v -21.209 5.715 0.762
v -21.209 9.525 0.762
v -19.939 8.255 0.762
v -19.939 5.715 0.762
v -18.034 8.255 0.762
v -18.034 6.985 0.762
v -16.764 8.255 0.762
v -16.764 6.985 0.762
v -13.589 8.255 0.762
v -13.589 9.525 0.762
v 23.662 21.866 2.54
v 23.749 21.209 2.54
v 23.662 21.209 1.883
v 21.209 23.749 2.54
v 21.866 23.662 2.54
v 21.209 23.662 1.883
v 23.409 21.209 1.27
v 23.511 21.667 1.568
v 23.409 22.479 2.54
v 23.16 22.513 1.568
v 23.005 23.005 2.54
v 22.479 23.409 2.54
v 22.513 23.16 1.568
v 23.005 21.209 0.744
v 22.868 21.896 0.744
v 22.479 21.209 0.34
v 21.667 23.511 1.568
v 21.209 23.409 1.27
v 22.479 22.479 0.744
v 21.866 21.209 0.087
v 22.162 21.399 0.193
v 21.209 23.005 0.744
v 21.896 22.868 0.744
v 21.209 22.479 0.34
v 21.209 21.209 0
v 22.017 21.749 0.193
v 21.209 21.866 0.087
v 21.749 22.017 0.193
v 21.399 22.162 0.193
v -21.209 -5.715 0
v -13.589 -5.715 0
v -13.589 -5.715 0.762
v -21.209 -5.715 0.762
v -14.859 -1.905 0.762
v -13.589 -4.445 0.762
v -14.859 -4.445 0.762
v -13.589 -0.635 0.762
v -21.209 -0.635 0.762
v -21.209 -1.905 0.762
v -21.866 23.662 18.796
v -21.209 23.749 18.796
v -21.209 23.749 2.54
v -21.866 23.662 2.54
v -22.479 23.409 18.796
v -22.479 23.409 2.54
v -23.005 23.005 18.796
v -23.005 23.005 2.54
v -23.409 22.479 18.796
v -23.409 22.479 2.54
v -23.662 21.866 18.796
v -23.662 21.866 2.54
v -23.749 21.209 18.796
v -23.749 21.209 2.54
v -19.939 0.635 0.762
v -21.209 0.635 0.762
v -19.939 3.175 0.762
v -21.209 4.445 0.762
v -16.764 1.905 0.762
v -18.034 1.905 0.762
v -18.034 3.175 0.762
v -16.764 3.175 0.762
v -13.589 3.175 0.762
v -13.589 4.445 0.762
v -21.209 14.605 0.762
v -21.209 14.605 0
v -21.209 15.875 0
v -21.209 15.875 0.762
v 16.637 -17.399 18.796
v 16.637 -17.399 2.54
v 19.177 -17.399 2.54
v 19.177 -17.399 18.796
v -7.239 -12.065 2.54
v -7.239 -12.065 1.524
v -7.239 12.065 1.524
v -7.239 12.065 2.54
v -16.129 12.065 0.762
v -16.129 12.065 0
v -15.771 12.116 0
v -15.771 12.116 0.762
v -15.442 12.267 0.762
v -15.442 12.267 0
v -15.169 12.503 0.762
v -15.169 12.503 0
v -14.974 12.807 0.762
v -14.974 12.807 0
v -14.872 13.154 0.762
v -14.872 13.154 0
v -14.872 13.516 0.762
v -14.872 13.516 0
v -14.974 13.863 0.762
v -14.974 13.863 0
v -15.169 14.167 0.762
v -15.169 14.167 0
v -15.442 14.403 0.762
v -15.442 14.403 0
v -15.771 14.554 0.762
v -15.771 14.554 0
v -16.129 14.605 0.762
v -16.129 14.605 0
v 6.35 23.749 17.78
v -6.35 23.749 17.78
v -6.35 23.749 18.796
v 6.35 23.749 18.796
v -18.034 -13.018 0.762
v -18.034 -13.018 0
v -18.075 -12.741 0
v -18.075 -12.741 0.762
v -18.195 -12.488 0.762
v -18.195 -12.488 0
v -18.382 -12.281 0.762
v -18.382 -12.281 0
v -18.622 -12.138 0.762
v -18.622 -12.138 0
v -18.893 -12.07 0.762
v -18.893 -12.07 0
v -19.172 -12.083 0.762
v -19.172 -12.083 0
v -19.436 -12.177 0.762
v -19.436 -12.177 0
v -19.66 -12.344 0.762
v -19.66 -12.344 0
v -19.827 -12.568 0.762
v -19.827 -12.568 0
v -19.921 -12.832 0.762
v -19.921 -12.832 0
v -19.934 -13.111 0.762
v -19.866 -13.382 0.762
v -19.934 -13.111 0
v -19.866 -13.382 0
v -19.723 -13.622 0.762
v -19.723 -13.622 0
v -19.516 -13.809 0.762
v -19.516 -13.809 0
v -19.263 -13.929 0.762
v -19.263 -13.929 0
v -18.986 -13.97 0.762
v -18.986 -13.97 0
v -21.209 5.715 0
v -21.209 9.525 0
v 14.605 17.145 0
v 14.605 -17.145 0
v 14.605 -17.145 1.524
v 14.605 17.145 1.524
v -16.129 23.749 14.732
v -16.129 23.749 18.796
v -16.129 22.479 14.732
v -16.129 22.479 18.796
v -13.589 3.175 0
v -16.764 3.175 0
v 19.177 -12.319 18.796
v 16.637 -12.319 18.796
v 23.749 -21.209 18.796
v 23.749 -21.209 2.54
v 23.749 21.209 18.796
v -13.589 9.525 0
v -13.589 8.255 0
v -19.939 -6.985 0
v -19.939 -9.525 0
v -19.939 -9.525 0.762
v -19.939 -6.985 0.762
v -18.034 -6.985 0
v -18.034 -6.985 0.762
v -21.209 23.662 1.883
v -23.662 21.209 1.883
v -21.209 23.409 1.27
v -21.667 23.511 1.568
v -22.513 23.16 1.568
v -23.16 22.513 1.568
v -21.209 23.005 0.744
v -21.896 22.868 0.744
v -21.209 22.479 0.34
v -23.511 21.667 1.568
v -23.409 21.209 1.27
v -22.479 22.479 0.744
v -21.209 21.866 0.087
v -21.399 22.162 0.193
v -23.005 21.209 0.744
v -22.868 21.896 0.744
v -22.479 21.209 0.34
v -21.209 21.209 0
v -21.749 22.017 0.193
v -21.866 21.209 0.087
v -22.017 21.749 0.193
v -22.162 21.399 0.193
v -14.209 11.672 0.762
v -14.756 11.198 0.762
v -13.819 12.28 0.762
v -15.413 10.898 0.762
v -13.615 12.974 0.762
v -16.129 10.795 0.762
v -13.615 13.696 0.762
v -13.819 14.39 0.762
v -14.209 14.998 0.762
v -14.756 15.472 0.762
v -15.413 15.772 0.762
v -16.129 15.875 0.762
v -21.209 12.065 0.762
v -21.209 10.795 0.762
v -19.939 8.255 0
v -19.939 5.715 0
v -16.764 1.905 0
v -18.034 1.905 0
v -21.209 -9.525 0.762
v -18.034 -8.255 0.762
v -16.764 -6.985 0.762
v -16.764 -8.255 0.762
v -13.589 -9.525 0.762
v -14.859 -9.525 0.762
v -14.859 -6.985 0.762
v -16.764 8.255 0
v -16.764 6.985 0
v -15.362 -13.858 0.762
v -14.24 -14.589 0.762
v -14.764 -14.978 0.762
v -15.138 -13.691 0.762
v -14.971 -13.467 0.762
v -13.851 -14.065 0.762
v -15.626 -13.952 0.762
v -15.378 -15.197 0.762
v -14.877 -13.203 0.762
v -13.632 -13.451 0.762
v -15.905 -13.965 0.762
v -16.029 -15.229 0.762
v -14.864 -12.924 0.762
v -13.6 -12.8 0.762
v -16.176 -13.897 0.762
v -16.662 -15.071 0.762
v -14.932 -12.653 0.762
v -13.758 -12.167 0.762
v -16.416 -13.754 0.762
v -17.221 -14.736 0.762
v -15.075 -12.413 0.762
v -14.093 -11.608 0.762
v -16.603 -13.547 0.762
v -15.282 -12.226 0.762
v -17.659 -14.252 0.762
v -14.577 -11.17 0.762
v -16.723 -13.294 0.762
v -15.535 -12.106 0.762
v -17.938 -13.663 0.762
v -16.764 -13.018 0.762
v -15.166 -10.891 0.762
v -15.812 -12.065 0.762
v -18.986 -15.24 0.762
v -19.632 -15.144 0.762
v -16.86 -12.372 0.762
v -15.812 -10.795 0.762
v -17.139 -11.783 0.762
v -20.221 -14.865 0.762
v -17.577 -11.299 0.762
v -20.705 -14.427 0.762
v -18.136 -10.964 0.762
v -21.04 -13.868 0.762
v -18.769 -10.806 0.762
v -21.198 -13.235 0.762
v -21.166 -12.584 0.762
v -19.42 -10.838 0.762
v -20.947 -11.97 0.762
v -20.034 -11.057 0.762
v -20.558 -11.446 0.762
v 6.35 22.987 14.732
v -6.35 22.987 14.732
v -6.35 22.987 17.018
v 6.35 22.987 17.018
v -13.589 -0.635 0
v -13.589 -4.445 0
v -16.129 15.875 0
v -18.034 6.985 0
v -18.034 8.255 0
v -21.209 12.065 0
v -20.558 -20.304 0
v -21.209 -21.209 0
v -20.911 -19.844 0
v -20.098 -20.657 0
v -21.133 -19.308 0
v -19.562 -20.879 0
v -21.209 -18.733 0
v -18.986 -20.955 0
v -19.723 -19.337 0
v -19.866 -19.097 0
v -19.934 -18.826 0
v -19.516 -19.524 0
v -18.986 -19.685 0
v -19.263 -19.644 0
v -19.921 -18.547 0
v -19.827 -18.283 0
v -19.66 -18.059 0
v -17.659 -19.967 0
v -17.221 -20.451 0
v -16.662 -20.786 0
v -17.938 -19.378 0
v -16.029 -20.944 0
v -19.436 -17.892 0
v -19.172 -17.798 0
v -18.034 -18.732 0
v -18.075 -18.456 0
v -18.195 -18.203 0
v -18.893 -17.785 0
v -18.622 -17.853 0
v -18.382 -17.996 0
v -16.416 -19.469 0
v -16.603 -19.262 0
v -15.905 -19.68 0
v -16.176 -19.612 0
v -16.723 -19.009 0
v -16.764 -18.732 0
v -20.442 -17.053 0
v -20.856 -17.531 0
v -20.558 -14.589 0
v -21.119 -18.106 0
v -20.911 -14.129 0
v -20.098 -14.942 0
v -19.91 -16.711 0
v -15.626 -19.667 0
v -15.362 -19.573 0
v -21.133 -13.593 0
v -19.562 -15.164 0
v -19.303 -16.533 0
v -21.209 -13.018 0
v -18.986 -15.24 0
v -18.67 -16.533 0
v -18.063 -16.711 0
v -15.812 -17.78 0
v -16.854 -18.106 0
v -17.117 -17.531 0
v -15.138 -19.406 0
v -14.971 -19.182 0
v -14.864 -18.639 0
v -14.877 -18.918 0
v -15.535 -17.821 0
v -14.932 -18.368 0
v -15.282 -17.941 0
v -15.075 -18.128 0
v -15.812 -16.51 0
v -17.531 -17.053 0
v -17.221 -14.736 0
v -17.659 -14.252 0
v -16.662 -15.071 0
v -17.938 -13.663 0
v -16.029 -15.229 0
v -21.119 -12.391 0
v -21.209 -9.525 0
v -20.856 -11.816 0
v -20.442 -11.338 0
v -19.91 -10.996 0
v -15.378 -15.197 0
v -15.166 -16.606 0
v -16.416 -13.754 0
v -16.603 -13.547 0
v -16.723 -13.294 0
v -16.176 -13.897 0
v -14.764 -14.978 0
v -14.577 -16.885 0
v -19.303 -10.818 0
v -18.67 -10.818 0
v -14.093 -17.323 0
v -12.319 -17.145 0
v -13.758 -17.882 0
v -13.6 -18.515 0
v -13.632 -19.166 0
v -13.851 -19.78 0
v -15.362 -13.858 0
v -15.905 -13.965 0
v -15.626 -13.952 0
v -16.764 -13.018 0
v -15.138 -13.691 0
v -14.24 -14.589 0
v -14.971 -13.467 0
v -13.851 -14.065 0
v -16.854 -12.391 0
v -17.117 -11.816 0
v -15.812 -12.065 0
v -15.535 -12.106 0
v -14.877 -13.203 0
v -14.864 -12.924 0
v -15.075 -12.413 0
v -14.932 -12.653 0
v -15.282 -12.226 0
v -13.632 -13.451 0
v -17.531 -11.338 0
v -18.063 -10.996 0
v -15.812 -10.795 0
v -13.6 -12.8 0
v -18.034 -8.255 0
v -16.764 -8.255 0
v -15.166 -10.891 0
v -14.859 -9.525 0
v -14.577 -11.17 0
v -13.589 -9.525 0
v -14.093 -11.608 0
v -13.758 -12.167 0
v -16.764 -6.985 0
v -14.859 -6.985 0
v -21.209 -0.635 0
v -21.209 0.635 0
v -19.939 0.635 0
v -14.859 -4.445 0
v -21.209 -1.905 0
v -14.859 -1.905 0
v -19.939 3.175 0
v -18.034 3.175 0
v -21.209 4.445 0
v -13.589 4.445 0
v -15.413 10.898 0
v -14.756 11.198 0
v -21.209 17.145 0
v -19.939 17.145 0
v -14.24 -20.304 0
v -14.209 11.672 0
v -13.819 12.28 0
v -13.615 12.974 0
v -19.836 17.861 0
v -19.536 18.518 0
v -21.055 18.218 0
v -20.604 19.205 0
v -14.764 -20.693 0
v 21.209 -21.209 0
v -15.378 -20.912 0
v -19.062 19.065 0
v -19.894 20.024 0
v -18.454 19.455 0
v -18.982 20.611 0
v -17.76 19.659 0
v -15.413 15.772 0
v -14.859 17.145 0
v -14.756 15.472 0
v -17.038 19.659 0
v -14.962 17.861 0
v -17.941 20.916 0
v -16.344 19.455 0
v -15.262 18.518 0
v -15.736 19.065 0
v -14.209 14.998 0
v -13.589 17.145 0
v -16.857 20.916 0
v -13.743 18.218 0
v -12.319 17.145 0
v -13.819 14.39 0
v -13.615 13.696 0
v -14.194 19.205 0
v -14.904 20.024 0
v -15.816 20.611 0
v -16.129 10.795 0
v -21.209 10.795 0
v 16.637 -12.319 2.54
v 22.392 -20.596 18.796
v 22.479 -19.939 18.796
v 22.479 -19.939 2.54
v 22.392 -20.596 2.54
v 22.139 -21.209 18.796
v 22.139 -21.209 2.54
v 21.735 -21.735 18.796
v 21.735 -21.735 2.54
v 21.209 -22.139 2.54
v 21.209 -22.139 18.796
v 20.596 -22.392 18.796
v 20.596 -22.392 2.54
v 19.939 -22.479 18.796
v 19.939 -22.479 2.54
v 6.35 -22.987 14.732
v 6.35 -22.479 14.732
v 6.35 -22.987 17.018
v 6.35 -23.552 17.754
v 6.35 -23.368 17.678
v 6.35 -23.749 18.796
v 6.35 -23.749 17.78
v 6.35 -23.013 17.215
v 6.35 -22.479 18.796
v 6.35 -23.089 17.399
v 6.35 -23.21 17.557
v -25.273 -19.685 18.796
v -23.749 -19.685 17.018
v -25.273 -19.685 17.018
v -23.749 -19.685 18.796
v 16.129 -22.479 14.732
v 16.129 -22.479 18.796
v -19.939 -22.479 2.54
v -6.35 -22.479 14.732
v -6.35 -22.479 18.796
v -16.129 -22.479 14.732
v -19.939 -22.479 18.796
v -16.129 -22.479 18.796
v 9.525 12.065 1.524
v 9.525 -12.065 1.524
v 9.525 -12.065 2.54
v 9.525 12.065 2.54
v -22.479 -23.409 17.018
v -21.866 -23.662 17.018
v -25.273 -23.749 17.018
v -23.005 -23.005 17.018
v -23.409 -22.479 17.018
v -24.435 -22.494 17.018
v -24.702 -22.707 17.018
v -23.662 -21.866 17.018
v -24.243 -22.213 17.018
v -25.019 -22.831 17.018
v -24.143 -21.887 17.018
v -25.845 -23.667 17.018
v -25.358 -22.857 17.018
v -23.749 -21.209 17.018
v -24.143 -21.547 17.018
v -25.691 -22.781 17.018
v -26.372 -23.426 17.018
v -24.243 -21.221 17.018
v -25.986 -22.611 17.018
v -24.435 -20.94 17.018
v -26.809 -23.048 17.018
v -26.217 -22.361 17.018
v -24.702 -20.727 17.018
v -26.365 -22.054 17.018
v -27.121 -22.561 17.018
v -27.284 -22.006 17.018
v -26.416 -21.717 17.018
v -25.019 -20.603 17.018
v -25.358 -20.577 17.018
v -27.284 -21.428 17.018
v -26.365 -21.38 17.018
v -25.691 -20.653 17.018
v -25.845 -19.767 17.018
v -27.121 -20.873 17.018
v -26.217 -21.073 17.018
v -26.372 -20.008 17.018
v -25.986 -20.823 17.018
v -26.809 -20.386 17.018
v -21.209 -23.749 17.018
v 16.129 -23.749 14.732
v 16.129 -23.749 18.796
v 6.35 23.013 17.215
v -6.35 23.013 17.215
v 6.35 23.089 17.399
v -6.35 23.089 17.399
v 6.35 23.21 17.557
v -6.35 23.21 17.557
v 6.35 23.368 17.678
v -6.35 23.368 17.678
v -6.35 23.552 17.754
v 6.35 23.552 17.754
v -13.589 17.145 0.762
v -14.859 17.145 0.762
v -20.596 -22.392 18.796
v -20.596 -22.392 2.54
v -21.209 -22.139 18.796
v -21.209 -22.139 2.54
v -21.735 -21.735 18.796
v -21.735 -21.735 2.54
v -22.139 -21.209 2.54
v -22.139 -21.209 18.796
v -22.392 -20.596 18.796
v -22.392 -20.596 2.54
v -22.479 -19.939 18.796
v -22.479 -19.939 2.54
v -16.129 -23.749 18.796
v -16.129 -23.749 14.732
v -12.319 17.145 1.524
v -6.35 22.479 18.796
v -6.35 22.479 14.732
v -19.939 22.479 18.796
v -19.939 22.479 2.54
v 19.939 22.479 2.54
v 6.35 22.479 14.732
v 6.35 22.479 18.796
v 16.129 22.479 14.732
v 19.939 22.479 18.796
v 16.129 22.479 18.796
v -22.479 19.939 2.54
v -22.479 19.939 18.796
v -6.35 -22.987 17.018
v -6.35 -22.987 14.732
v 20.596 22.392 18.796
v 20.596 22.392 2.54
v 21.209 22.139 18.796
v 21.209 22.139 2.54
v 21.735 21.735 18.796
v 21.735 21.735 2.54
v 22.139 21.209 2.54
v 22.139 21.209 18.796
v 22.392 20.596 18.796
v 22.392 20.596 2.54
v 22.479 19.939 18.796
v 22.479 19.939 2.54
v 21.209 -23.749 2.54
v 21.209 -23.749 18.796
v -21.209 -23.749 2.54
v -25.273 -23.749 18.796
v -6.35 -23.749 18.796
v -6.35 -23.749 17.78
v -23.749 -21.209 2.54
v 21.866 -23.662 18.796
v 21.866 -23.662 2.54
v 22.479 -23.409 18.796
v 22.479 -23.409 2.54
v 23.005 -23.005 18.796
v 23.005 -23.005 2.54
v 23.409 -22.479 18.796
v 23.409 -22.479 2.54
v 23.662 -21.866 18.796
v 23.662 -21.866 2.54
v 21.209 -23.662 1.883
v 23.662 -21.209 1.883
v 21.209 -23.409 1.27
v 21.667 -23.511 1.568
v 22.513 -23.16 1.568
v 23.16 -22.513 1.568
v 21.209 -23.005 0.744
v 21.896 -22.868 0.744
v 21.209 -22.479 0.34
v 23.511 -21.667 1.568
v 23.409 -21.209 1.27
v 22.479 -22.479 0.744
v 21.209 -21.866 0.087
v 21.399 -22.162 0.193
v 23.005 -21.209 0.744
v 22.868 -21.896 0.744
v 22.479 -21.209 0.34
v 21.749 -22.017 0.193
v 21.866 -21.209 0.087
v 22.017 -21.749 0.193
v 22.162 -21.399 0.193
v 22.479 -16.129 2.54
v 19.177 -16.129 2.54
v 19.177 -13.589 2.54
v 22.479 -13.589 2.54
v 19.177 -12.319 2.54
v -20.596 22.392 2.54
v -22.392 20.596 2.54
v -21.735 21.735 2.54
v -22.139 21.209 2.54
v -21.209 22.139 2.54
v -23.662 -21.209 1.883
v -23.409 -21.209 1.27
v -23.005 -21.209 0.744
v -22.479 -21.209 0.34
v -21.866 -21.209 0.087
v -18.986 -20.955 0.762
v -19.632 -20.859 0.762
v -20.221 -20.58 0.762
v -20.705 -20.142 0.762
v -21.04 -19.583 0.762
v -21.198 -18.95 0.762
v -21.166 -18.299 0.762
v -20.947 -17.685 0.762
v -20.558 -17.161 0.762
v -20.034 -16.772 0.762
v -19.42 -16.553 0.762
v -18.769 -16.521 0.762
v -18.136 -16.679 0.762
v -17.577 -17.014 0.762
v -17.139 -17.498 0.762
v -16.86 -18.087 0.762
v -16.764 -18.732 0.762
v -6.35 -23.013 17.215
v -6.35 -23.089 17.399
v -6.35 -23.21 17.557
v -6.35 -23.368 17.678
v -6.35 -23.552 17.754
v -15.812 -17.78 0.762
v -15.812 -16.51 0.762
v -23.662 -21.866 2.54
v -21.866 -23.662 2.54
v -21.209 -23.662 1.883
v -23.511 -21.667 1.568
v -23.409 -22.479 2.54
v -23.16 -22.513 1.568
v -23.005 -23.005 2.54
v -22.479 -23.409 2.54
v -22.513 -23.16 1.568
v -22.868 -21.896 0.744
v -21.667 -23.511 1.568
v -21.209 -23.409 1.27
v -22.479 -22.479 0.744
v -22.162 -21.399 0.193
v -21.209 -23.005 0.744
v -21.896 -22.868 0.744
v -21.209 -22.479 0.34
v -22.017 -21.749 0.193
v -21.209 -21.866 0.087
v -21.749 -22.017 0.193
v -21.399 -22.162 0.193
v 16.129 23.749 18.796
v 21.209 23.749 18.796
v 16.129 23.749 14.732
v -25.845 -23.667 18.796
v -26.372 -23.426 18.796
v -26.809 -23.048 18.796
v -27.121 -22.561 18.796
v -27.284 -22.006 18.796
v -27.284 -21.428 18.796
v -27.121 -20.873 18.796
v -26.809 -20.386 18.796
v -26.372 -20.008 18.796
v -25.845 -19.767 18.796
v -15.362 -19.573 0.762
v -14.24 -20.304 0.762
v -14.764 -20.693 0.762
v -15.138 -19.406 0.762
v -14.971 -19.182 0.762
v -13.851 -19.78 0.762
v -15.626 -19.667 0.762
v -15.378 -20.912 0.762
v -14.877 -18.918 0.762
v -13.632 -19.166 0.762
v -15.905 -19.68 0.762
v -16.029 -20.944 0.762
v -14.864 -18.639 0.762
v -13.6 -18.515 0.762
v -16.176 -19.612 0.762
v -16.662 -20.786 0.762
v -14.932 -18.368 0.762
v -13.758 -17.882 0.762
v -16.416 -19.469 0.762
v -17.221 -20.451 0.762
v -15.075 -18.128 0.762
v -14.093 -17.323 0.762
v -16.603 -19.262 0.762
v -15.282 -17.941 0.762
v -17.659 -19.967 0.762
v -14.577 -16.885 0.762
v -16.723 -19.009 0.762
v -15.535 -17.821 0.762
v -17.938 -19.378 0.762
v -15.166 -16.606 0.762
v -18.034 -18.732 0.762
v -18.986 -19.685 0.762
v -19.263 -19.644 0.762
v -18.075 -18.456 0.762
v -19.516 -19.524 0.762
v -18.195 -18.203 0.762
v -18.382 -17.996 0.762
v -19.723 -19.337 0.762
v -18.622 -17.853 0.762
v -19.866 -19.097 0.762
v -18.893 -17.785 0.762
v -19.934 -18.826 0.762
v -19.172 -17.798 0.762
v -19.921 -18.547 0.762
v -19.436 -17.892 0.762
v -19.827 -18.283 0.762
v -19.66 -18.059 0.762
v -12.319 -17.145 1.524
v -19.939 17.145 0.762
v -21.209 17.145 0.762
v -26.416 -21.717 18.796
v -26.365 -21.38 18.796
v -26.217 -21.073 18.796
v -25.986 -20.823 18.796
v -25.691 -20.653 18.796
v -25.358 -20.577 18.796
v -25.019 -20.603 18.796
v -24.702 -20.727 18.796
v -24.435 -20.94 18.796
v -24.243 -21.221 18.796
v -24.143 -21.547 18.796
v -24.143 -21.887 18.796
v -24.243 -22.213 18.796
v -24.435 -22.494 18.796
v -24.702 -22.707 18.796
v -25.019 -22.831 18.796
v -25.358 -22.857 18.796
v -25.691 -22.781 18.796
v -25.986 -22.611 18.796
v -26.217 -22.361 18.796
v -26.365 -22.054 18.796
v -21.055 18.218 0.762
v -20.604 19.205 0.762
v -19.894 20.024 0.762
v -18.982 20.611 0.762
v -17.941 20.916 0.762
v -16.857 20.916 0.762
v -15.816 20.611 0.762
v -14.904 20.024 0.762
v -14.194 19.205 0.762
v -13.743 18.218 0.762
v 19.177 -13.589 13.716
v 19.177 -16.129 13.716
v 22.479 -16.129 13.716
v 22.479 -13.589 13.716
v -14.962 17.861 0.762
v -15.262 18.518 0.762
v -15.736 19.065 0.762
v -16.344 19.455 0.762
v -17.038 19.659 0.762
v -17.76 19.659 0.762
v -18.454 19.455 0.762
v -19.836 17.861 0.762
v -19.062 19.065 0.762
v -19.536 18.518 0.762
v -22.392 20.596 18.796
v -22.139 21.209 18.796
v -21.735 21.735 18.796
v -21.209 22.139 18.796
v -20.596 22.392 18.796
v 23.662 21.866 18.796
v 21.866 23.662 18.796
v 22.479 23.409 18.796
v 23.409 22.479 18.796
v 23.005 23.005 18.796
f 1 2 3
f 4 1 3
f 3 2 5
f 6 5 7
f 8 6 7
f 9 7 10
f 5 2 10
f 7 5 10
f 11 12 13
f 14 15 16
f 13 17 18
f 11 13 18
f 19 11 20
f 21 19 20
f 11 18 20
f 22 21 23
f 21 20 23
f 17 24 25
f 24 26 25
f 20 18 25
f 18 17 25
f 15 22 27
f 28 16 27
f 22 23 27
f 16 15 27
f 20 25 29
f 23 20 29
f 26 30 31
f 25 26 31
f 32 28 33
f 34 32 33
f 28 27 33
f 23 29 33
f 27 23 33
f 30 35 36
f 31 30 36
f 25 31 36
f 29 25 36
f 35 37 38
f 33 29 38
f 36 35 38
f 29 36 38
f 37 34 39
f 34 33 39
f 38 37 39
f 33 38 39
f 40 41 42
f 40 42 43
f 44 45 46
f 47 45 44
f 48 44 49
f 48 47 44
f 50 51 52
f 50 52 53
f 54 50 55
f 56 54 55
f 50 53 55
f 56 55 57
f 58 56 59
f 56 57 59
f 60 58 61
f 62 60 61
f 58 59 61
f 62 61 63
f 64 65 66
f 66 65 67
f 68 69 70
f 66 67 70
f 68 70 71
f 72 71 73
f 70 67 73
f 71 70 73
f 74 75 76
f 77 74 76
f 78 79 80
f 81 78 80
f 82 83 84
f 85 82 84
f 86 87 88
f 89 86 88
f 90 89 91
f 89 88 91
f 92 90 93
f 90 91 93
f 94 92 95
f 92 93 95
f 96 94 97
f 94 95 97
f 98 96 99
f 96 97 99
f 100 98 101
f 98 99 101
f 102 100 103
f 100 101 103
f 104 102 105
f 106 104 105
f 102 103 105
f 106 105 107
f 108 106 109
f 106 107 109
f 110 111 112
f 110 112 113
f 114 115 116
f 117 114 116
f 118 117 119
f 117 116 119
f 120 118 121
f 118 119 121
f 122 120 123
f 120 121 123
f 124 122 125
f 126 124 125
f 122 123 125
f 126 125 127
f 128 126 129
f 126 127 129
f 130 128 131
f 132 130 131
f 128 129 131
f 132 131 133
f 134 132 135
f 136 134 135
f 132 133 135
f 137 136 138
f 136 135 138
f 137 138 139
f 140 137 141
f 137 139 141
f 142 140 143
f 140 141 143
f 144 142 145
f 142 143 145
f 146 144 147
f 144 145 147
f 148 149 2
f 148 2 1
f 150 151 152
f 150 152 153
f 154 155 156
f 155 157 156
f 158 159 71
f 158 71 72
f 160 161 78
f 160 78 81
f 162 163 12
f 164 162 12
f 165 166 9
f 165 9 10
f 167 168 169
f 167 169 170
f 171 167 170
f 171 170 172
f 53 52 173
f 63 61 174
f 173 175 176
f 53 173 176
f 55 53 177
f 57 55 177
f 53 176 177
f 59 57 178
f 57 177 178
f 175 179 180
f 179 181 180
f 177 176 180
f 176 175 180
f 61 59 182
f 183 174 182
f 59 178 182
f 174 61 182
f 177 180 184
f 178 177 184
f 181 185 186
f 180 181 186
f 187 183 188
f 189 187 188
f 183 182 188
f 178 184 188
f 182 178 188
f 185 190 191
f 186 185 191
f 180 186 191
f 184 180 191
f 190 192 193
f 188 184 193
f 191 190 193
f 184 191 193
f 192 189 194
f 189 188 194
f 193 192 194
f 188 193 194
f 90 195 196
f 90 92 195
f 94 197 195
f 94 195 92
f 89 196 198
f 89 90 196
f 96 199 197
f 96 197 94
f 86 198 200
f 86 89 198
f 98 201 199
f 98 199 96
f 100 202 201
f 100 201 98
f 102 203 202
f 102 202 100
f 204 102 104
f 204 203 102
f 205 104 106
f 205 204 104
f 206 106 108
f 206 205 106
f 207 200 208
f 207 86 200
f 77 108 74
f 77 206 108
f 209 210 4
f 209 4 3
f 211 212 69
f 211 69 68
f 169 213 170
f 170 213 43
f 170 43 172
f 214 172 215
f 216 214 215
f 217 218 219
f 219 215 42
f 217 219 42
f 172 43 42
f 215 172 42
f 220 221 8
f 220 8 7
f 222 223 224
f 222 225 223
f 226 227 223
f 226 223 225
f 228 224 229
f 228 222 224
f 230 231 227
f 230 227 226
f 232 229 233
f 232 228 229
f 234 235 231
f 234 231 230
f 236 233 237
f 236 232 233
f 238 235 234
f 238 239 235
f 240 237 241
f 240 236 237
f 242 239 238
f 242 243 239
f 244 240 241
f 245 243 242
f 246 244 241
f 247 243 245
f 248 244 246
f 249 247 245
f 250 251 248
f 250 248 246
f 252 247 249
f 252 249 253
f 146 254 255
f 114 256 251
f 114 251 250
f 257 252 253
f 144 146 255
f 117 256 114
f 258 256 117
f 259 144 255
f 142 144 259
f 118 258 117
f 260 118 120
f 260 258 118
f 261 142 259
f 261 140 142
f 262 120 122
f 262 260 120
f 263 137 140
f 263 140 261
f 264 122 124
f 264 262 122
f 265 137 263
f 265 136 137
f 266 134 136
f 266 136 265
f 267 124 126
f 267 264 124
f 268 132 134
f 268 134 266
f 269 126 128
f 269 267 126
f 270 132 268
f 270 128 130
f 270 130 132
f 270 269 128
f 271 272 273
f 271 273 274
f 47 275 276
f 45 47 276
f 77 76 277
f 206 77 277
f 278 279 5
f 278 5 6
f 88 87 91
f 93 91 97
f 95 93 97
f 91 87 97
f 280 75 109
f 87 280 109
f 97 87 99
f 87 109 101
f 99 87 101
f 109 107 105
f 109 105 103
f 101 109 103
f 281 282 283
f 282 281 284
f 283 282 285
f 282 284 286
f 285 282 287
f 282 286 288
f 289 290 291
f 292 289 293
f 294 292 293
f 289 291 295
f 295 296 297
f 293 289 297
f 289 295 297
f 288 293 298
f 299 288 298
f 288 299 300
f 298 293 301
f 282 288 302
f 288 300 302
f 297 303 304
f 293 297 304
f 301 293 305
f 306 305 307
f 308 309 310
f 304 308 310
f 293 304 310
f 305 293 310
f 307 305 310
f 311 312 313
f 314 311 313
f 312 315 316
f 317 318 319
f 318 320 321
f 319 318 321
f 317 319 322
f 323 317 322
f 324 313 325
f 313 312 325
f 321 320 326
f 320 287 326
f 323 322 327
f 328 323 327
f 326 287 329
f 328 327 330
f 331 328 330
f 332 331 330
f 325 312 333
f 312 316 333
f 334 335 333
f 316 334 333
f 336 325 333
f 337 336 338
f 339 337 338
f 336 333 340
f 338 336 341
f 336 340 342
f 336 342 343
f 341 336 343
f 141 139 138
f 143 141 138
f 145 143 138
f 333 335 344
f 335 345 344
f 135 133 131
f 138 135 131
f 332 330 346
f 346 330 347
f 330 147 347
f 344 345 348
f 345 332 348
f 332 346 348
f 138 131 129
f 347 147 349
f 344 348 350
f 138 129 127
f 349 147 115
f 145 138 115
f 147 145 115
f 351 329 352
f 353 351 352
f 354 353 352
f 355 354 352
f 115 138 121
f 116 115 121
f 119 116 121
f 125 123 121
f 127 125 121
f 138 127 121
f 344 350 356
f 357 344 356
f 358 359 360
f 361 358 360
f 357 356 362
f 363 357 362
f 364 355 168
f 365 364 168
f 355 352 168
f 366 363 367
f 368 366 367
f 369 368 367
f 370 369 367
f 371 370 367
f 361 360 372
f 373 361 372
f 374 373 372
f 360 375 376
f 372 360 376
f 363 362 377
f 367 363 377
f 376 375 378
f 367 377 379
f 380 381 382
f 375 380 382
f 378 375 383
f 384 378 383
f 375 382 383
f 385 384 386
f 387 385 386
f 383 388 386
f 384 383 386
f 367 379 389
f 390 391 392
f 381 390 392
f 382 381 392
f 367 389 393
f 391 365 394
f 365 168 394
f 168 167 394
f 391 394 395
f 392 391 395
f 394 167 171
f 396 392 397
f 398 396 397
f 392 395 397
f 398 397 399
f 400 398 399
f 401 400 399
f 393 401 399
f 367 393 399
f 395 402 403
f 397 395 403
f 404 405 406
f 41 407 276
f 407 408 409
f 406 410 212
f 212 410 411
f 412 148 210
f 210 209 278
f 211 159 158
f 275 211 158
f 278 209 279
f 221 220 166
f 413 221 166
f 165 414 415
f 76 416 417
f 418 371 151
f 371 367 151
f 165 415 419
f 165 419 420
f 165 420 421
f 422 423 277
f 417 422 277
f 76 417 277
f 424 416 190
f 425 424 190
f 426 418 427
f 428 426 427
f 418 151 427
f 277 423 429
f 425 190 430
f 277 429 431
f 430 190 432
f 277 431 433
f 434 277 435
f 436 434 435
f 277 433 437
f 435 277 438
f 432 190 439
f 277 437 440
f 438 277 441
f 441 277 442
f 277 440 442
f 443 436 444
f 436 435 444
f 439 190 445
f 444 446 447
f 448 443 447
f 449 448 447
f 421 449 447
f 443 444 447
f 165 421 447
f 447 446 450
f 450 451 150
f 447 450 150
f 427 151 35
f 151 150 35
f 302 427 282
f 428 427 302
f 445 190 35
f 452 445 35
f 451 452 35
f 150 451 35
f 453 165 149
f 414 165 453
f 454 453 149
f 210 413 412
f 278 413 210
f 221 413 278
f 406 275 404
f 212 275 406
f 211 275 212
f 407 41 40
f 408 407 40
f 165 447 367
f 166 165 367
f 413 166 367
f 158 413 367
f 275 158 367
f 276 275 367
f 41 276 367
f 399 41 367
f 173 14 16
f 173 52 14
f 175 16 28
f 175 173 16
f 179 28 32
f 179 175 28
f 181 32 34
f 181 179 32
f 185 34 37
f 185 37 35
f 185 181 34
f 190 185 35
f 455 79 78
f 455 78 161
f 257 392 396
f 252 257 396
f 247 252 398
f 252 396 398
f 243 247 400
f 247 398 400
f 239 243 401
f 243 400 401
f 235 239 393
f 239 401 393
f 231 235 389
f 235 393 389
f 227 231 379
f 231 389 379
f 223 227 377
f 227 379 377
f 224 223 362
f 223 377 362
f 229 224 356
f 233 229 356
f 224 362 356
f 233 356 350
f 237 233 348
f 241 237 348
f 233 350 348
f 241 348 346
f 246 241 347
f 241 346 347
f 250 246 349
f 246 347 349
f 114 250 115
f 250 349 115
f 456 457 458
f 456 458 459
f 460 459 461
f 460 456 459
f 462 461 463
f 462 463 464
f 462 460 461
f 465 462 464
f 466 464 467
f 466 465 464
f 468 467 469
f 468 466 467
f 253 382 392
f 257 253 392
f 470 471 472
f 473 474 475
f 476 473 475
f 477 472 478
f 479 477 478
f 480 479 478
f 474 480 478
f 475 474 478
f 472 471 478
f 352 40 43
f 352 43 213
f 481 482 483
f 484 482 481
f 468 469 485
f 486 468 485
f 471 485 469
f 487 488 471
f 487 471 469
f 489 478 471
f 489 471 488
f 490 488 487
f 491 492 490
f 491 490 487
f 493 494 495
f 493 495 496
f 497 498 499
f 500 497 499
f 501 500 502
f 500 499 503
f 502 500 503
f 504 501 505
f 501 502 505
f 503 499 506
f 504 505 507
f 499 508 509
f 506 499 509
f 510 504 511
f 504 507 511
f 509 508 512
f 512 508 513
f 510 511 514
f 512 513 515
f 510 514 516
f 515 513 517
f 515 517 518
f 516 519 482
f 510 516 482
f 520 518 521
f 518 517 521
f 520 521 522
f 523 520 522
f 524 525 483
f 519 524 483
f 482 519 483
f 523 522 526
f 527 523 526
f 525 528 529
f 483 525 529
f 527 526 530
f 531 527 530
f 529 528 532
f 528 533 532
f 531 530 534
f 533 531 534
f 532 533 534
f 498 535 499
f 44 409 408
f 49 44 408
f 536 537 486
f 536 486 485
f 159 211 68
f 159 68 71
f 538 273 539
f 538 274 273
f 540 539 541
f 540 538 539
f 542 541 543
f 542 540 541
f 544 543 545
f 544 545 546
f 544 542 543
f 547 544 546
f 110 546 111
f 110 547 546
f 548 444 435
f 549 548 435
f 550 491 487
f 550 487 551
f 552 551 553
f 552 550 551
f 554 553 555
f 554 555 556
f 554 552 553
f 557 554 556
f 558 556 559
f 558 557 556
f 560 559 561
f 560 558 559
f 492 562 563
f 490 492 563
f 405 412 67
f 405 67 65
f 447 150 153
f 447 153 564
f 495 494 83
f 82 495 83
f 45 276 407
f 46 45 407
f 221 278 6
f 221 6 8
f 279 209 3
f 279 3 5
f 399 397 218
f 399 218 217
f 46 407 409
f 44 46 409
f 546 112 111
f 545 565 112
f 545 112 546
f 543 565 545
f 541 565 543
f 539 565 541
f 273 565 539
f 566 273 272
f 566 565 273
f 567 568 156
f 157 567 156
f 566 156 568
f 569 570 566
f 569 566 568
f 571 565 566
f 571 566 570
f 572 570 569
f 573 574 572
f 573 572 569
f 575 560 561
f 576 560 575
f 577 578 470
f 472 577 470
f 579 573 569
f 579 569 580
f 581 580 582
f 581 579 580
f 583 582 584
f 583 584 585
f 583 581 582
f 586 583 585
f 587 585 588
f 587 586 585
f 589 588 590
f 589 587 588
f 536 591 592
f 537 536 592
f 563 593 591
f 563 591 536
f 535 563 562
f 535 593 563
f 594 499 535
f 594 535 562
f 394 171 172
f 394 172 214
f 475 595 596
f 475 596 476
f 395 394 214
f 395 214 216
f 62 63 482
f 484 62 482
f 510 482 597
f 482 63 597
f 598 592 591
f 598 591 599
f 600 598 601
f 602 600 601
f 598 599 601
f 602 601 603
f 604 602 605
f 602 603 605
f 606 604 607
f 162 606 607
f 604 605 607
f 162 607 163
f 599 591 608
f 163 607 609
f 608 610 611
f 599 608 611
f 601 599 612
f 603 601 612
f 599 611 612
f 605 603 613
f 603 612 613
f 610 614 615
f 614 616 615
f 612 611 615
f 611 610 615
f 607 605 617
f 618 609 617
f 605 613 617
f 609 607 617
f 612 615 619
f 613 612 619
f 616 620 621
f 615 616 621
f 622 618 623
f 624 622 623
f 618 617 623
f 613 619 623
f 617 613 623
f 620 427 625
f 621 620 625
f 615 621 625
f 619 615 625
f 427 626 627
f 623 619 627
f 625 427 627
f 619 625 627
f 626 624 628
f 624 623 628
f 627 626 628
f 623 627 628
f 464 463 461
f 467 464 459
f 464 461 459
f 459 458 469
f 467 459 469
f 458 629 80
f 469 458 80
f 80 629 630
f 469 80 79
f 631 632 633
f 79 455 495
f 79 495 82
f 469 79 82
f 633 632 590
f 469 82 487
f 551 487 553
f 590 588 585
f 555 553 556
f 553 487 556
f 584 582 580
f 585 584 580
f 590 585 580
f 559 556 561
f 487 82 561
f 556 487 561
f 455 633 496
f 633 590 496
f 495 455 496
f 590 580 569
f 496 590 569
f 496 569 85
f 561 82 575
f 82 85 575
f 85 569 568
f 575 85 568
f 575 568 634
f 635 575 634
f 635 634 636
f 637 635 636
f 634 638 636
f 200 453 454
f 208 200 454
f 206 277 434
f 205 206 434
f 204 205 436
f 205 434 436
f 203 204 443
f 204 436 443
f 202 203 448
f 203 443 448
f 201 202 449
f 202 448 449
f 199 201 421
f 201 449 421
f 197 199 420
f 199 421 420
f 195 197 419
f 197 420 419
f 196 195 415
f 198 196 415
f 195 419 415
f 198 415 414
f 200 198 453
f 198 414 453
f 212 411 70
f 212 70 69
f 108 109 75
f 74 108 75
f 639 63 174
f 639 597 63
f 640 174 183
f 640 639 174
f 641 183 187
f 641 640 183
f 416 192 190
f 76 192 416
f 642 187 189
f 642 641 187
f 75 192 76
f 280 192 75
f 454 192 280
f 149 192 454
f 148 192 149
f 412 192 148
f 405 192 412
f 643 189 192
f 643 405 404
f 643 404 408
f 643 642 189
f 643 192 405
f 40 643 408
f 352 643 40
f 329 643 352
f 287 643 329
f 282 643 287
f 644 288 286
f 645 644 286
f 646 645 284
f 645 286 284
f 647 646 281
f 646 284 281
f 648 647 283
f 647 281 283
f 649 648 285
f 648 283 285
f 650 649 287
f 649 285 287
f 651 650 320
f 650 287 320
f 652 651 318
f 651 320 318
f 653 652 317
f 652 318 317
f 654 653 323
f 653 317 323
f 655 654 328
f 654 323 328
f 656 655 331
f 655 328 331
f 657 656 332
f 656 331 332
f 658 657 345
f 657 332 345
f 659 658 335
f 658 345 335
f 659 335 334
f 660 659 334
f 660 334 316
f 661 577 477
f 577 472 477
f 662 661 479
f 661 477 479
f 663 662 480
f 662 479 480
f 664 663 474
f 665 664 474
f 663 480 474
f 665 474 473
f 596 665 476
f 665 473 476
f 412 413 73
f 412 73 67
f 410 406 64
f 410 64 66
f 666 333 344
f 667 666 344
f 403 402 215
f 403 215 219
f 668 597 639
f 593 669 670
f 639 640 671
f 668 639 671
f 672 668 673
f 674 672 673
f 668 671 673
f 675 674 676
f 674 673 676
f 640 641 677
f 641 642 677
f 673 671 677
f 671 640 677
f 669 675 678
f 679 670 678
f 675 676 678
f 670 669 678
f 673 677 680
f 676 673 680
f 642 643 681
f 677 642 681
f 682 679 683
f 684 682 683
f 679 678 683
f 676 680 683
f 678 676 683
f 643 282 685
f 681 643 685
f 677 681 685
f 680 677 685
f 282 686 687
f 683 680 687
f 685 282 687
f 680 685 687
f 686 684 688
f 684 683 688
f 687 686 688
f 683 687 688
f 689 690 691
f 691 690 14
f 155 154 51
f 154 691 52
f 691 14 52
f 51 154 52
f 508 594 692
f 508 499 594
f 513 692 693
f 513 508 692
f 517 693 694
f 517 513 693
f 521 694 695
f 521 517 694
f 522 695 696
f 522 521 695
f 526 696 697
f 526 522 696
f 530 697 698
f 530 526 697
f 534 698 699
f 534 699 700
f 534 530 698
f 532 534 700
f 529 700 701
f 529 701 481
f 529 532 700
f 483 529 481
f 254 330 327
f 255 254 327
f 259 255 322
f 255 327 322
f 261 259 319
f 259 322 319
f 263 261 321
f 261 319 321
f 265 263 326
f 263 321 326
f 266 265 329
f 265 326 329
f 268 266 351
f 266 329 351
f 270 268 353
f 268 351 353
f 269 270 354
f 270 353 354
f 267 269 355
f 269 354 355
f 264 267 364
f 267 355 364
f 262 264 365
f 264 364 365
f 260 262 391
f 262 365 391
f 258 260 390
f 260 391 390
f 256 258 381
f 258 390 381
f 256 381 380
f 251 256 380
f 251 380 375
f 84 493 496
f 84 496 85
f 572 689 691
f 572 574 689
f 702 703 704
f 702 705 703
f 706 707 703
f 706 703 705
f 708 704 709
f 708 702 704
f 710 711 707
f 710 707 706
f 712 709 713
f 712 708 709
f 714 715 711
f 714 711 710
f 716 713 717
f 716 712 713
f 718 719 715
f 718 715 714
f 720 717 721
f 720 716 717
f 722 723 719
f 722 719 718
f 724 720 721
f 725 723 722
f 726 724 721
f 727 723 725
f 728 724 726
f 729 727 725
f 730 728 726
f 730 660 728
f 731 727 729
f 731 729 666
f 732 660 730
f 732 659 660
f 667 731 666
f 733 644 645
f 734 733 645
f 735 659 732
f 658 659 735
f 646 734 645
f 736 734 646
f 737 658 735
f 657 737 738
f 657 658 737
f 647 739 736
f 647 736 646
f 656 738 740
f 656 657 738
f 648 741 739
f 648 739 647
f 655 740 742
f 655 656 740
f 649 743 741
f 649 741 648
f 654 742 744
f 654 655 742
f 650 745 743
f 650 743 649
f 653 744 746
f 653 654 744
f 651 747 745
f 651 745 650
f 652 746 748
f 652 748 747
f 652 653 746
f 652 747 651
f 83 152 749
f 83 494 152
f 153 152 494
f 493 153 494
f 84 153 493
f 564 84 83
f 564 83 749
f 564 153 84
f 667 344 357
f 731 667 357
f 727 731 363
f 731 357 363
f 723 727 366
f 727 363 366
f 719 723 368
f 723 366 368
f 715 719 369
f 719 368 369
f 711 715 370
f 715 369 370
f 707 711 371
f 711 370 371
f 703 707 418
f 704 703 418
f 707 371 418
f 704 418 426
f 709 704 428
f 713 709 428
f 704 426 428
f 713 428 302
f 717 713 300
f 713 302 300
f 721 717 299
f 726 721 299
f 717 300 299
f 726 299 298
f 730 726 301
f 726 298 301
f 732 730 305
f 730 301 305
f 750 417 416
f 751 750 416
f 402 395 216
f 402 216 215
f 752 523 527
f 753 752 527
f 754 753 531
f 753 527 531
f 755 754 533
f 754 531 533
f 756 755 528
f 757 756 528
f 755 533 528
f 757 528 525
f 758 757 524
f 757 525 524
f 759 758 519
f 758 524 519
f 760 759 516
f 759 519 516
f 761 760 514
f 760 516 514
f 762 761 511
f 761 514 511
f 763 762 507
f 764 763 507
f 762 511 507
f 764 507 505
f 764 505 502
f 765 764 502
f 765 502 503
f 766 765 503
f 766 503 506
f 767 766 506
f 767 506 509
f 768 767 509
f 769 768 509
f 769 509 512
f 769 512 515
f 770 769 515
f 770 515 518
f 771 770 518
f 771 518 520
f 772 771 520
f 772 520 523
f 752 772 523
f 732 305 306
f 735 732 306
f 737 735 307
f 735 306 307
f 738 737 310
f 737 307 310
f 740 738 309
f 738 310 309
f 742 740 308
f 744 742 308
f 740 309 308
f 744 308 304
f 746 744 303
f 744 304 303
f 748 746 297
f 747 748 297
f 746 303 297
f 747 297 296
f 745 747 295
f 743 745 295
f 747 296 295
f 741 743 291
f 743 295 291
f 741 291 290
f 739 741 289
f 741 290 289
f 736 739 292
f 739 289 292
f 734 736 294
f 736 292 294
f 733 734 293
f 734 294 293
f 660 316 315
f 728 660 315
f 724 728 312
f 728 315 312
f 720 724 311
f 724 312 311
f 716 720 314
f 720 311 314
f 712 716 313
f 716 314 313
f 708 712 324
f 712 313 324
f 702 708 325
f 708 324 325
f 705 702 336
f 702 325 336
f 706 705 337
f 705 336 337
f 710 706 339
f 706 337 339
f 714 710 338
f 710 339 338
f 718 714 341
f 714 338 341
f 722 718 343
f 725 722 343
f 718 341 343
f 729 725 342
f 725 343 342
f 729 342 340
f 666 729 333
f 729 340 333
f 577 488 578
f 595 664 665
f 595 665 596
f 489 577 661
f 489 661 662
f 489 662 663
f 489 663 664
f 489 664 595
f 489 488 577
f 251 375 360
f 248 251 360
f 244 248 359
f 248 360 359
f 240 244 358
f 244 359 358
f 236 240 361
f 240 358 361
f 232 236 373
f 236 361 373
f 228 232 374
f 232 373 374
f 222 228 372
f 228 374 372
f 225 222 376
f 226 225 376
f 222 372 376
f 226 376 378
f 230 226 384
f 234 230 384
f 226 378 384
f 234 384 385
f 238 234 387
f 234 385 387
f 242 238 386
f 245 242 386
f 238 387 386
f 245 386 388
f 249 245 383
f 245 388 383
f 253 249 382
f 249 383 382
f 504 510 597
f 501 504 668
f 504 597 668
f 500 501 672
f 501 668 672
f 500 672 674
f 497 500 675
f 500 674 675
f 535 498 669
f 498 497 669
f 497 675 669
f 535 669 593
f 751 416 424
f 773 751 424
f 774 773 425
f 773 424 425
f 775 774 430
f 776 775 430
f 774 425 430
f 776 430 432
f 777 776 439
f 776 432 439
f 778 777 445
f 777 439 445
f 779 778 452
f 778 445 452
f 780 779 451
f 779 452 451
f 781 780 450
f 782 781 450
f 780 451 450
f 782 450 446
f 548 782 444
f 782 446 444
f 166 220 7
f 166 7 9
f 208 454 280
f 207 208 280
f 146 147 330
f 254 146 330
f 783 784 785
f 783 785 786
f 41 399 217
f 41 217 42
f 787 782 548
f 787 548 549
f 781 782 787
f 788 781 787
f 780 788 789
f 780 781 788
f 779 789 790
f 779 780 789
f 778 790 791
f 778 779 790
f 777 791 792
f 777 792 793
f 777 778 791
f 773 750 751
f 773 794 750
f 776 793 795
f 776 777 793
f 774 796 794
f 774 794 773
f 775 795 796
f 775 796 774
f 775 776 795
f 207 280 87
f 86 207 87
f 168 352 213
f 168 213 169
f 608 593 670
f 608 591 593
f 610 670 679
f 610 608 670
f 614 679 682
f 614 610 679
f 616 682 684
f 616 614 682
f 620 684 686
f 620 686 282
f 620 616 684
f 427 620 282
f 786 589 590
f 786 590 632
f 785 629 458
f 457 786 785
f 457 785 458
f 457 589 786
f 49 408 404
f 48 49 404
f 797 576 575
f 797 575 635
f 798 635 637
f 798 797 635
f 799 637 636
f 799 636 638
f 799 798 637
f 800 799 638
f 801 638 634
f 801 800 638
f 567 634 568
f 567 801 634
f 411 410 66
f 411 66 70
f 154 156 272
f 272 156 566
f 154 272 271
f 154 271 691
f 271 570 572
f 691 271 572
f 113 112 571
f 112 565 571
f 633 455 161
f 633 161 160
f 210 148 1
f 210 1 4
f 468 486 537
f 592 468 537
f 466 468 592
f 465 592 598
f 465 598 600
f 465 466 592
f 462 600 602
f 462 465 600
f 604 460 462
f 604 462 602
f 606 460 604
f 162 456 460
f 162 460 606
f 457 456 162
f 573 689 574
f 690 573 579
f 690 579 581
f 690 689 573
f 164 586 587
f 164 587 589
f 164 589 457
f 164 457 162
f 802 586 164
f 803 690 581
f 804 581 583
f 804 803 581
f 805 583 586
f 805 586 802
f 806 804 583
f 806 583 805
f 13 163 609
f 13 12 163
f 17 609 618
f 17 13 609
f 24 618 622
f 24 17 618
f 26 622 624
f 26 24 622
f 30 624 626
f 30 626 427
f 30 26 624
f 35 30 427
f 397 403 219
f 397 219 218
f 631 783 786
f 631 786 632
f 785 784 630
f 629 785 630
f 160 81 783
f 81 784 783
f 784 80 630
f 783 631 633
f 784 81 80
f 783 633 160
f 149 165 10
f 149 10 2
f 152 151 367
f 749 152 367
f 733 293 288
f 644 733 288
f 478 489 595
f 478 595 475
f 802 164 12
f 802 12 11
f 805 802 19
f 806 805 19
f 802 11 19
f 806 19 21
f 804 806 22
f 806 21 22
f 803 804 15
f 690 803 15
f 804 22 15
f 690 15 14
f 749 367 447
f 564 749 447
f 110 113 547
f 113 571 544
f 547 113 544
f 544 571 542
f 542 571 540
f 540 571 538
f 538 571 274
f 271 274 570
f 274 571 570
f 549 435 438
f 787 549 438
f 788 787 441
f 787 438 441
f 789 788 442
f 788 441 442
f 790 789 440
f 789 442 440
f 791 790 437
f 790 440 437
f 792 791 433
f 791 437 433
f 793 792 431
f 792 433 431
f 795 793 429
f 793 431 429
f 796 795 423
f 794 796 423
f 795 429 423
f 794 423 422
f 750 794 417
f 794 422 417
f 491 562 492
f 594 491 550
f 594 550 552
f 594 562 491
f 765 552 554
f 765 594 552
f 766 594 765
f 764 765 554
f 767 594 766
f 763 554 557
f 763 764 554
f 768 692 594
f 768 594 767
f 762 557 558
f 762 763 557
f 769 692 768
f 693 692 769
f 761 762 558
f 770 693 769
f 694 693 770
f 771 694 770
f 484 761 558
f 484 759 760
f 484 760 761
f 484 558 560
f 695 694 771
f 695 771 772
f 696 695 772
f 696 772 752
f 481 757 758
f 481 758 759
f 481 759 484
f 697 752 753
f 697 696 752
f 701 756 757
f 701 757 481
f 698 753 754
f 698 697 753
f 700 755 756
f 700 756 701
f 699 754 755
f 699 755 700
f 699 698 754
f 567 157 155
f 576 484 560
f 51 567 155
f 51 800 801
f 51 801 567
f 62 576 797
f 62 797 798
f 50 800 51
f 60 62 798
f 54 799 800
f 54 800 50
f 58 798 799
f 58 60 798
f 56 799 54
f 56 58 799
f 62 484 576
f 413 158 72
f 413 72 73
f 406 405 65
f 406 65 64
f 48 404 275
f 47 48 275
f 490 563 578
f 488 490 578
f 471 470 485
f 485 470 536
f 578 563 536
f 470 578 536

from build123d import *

# Parameters (mm, degrees)
BOSS_EXTRUDE1_DEPTH             = 18.796
CUT_EXTRUDE1_DEPTH              = 16.256
FILLET1_R                       = 2.54
CUT_EXTRUDE2_DEPTH              = 57.332624837
CUT_EXTRUDE2_DEPTH_BACK         = 57.332624837
SKETCH3_W                       = 32.258
SKETCH3_H                       = 8.128
SKETCH5_W                       = 26.924
SKETCH5_H                       = 34.29
CUT_EXTRUDE4_DEPTH              = 1.524
SKETCH6_W                       = 16.764
SKETCH6_H                       = 24.13
CUT_EXTRUDE5_DEPTH              = 1.524
SKETCH8_W                       = 12.7
SKETCH8_H                       = 0.508
BOSS_EXTRUDE3_DEPTH             = 4.064
SKETCH9_W                       = 12.7
SKETCH9_H                       = 1.016
BOSS_EXTRUDE4_DEPTH             = 0.762
FILLET2_R                       = 0.762
SKETCH10_W                      = 12.7
SKETCH10_H                      = 1.016
BOSS_EXTRUDE5_DEPTH             = 0.762
FILLET3_R                       = 0.762
SKETCH11_W                      = 1.778
SKETCH11_H                      = 4.064
BOSS_EXTRUDE6_DEPTH             = 3.556
BOSS_EXTRUDE6_DIRECTION_2_REACH = 58.333
FILLET4_RADIUS                  = 2.032
FILLET4_LENGTH                  = 1.778
SKETCH12_R                      = 1.143
CUT_EXTRUDE7_DEPTH              = 4.064
CUT_EXTRUDE8_DEPTH              = 0.762
SKETCH13_W                      = 2.54
SKETCH13_H                      = 5.08
BOSS_EXTRUDE7_DEPTH             = 16.256
SKETCH15_W                      = 11.176
SKETCH15_H                      = 2.54
BOSS_EXTRUDE8_DEPTH             = 3.556


with BuildPart() as part:
    # Sketch1 → Boss-Extrude1 (new body)
    with BuildSketch(Plane.XY):
        with BuildLine():
            Line((-21.209, -23.749), (21.209, -23.749))
            ThreePointArc((21.209, -23.749), (23.005051224, -23.005051224), (23.749, -21.209))
            Line((23.749, -21.209), (23.749, 21.209))
            ThreePointArc((23.749, 21.209), (23.005051224, 23.005051224), (21.209, 23.749))
            Line((21.209, 23.749), (-21.209, 23.749))
            ThreePointArc((-21.209, 23.749), (-23.005051224, 23.005051224), (-23.749, 21.209))
            Line((-23.749, 21.209), (-23.749, -21.209))
            ThreePointArc((-23.749, -21.209), (-23.005051224, -23.005051224), (-21.209, -23.749))
        make_face()
    extrude(amount=BOSS_EXTRUDE1_DEPTH)

    # Sketch2 → Cut-Extrude1 (cut)
    with BuildSketch(Plane.XY.offset(18.796)):
        with BuildLine():
            Line((19.939, -22.479), (-19.939, -22.479))
            ThreePointArc((-19.939, -22.479), (-21.735051224, -21.735051224), (-22.479, -19.939))
            Line((-22.479, -19.939), (-22.479, 19.939))
            ThreePointArc((-22.479, 19.939), (-21.735051224, 21.735051224), (-19.939, 22.479))
            Line((-19.939, 22.479), (19.939, 22.479))
            ThreePointArc((19.939, 22.479), (21.735051224, 21.735051224), (22.479, 19.939))
            Line((22.479, 19.939), (22.479, -19.939))
            ThreePointArc((22.479, -19.939), (21.735051224, -21.735051224), (19.939, -22.479))
        make_face()
    extrude(amount=-CUT_EXTRUDE1_DEPTH, mode=Mode.SUBTRACT)

    # Fillet1
    fillet1_edges = [part.edges().sort_by_distance(p)[0] for p in [
        (0, -23.749, 0),
        (-23.005051224, -23.005051224, 0),
        (-23.749, 0, 0),
        (-23.005051224, 23.005051224, 0),
        (0, 23.749, 0),
        (23.005051224, 23.005051224, 0),
        (23.749, 0, 0),
        (23.005051224, -23.005051224, 0),
    ]]
    fillet(fillet1_edges, radius=FILLET1_R)

    # Sketch3 → Cut-Extrude2 (cut, two sides: drawn at the far end of the back side and taken through both)
    with BuildSketch(Plane(origin=(0, 23.749, 0), x_dir=(1, 0, 0), z_dir=(0, 1, 0)).offset(-CUT_EXTRUDE2_DEPTH_BACK)):
        with Locations((0, -18.796)):
            Rectangle(SKETCH3_W, SKETCH3_H)
    extrude(amount=CUT_EXTRUDE2_DEPTH + CUT_EXTRUDE2_DEPTH_BACK, mode=Mode.SUBTRACT)

    # Sketch5 → Cut-Extrude4 (cut)
    with BuildSketch(Plane(origin=(0, 0, 0), x_dir=(-1, 0, 0), z_dir=(0, 0, -1))):
        with Locations((-1.143, 0)):
            Rectangle(SKETCH5_W, SKETCH5_H)
    extrude(amount=-CUT_EXTRUDE4_DEPTH, mode=Mode.SUBTRACT)

    # Sketch6 → Cut-Extrude5 (cut)
    with BuildSketch(Plane(origin=(0, 0, 1.524), x_dir=(-1, 0, 0), z_dir=(0, 0, -1))):
        with Locations((-1.143, 0)):
            Rectangle(SKETCH6_W, SKETCH6_H)
    extrude(amount=-CUT_EXTRUDE5_DEPTH, mode=Mode.SUBTRACT)

    # Sketch8 → Boss-Extrude3 (add)
    with BuildSketch(Plane.XY.offset(14.732)):
        with Locations((0, 22.733)):
            Rectangle(SKETCH8_W, SKETCH8_H)
        with Locations((0, -22.733)):
            Rectangle(SKETCH8_W, SKETCH8_H)
    extrude(amount=BOSS_EXTRUDE3_DEPTH)

    # Sketch9 → Boss-Extrude4 (add)
    with BuildSketch(Plane(origin=(0, 22.987, 0), x_dir=(1, 0, 0), z_dir=(0, 1, 0))):
        with Locations((0, -18.288)):
            Rectangle(SKETCH9_W, SKETCH9_H)
    extrude(amount=BOSS_EXTRUDE4_DEPTH)

    # Fillet2
    fillet2_edges = [part.edges().sort_by_distance(p)[0] for p in [
        (0, 22.987, 17.78),
    ]]
    fillet(fillet2_edges, radius=FILLET2_R - 0.0001)  # a hair under: the kernel refuses the full size

    # Sketch10 → Boss-Extrude5 (add)
    with BuildSketch(Plane.XZ.offset(22.987)):
        with Locations((0, 18.288)):
            Rectangle(SKETCH10_W, SKETCH10_H)
    extrude(amount=BOSS_EXTRUDE5_DEPTH)

    # Fillet3
    fillet3_edges = [part.edges().sort_by_distance(p)[0] for p in [
        (0, -22.987, 17.78),
    ]]
    fillet(fillet3_edges, radius=FILLET3_R - 0.0001)  # a hair under: the kernel refuses the full size

    # Sketch11 → Boss-Extrude6 (add)
    with BuildSketch(Plane.ZY.offset(23.749)):
        with Locations((17.907, -21.717)):
            Rectangle(SKETCH11_W, SKETCH11_H)
    extrude(amount=BOSS_EXTRUDE6_DEPTH)

    # Sketch11 → Boss-Extrude6 direction 2 (add, up to next)
    with BuildSketch(Plane.ZY.offset(23.749), mode=Mode.PRIVATE) as boss_extrude6_direction_2_sk1:
        with Locations((17.907, -21.717)):
            Rectangle(SKETCH11_W, SKETCH11_H)
    boss_extrude6_direction_2_tool1 = extrude(boss_extrude6_direction_2_sk1.sketch, amount=-BOSS_EXTRUDE6_DIRECTION_2_REACH, mode=Mode.PRIVATE) - part.part
    add(boss_extrude6_direction_2_tool1.solids().sort_by_distance((-23.749, -21.717, 17.907))[0])

    # Fillet4: full round fillet: the end face becomes a half cylinder, R = half its width
    fillet4_face = Plane((-27.305, -21.717, 17.907), x_dir=(0, 0, -1), z_dir=(-1, 0, 0))  # on the end face: x along it, z out of the body
    fillet4_slab = fillet4_face.offset(-FILLET4_RADIUS / 2) * Box(FILLET4_LENGTH, 2 * FILLET4_RADIUS, FILLET4_RADIUS, mode=Mode.PRIVATE)  # the body's end, R deep
    fillet4_round = Plane((-25.273, -21.717, 17.907), x_dir=(-1, 0, 0), z_dir=(0, 0, -1)) * Cylinder(FILLET4_RADIUS, FILLET4_LENGTH, mode=Mode.PRIVATE)  # its axis R under the face
    add(fillet4_slab - fillet4_round, mode=Mode.SUBTRACT)

    # Sketch12 → Cut-Extrude7 (cut)
    with BuildSketch(Plane(origin=(0, 0, 17.018), x_dir=(-1, 0, 0), z_dir=(0, 0, -1))):
        with Locations((25.273, -21.717)):
            Circle(SKETCH12_R)
    extrude(amount=-CUT_EXTRUDE7_DEPTH, mode=Mode.SUBTRACT)

    # Sketch7 → Cut-Extrude8 (cut)
    with BuildSketch(Plane(origin=(0, 0, 0), x_dir=(-1, 0, 0), z_dir=(0, 0, -1))):
        with BuildLine():
            Line((19.939, 17.145), (21.209, 17.145))
            ThreePointArc((21.209, 17.145), (17.399, 20.955), (13.589, 17.145))
            Line((13.589, 17.145), (14.859, 17.145))
            ThreePointArc((14.859, 17.145), (17.399, 19.685), (19.939, 17.145))
        make_face()
        with BuildLine():
            Line((21.209, 15.875), (16.129, 15.875))
            ThreePointArc((16.129, 15.875), (13.589, 13.335), (16.129, 10.795))
            Line((16.129, 10.795), (21.209, 10.795))
            Line((21.209, 10.795), (21.209, 12.065))
            Line((21.209, 12.065), (16.129, 12.065))
            ThreePointArc((16.129, 12.065), (14.859, 13.335), (16.129, 14.605))
            Line((16.129, 14.605), (21.209, 14.605))
            Line((21.209, 14.605), (21.209, 15.875))
        make_face()
        Polygon((13.589, 9.525), (21.209, 9.525), (21.209, 5.715), (19.939, 5.715), (19.939, 8.255), (18.034, 8.255), (18.034, 6.985), (16.764, 6.985), (16.764, 8.255), (13.589, 8.255), align=None)
        Polygon((13.589, 4.445), (21.209, 4.445), (21.209, 0.635), (19.939, 0.635), (19.939, 3.175), (18.034, 3.175), (18.034, 1.905), (16.764, 1.905), (16.764, 3.175), (13.589, 3.175), align=None)
        Polygon((21.209, -0.635), (13.589, -0.635), (13.589, -4.445), (14.859, -4.445), (14.859, -1.905), (21.209, -1.905), align=None)
        Polygon((13.589, -5.715), (21.209, -5.715), (21.209, -9.525), (19.939, -9.525), (19.939, -6.985), (18.034, -6.985), (18.034, -8.255), (16.764, -8.255), (16.764, -6.985), (14.859, -6.985), (14.859, -9.525), (13.589, -9.525), align=None)
        with BuildLine():
            Line((18.9865, -13.97), (18.9865, -15.24))
            ThreePointArc((18.9865, -15.24), (20.558044821, -11.445955179), (16.764, -13.0175))
            ThreePointArc((16.764, -13.0175), (15.137980791, -13.691019209), (15.8115, -12.065))
            Line((15.8115, -12.065), (15.8115, -10.795))
            ThreePointArc((15.8115, -10.795), (14.239955179, -14.589044821), (18.034, -13.0175))
            ThreePointArc((18.034, -13.0175), (19.660019209, -12.343980791), (18.9865, -13.97))
        make_face()
        with BuildLine():
            Line((15.8115, -17.78), (15.8115, -16.51))
            ThreePointArc((15.8115, -16.51), (14.239955179, -20.304044821), (18.034, -18.7325))
            ThreePointArc((18.034, -18.7325), (19.660019209, -18.058980791), (18.9865, -19.685))
            Line((18.9865, -19.685), (18.9865, -20.955))
            ThreePointArc((18.9865, -20.955), (20.558044821, -17.160955179), (16.764, -18.7325))
            ThreePointArc((16.764, -18.7325), (15.137980791, -19.406019209), (15.8115, -17.78))
        make_face()
    extrude(amount=-CUT_EXTRUDE8_DEPTH, mode=Mode.SUBTRACT)

    # Sketch13 → Boss-Extrude7 (add)
    with BuildSketch(Plane.XY.offset(2.54)):
        with Locations((17.907, -14.859)):
            Rectangle(SKETCH13_W, SKETCH13_H)
    extrude(amount=BOSS_EXTRUDE7_DEPTH)

    # Sketch15 → Boss-Extrude8 (add)
    with BuildSketch(Plane(origin=(19.177, 0, 0), x_dir=(0, 0, -1), z_dir=(1, 0, 0))):
        with Locations((-8.128, -14.859)):
            Rectangle(SKETCH15_W, SKETCH15_H)
    extrude(amount=BOSS_EXTRUDE8_DEPTH)


solid = part.part
